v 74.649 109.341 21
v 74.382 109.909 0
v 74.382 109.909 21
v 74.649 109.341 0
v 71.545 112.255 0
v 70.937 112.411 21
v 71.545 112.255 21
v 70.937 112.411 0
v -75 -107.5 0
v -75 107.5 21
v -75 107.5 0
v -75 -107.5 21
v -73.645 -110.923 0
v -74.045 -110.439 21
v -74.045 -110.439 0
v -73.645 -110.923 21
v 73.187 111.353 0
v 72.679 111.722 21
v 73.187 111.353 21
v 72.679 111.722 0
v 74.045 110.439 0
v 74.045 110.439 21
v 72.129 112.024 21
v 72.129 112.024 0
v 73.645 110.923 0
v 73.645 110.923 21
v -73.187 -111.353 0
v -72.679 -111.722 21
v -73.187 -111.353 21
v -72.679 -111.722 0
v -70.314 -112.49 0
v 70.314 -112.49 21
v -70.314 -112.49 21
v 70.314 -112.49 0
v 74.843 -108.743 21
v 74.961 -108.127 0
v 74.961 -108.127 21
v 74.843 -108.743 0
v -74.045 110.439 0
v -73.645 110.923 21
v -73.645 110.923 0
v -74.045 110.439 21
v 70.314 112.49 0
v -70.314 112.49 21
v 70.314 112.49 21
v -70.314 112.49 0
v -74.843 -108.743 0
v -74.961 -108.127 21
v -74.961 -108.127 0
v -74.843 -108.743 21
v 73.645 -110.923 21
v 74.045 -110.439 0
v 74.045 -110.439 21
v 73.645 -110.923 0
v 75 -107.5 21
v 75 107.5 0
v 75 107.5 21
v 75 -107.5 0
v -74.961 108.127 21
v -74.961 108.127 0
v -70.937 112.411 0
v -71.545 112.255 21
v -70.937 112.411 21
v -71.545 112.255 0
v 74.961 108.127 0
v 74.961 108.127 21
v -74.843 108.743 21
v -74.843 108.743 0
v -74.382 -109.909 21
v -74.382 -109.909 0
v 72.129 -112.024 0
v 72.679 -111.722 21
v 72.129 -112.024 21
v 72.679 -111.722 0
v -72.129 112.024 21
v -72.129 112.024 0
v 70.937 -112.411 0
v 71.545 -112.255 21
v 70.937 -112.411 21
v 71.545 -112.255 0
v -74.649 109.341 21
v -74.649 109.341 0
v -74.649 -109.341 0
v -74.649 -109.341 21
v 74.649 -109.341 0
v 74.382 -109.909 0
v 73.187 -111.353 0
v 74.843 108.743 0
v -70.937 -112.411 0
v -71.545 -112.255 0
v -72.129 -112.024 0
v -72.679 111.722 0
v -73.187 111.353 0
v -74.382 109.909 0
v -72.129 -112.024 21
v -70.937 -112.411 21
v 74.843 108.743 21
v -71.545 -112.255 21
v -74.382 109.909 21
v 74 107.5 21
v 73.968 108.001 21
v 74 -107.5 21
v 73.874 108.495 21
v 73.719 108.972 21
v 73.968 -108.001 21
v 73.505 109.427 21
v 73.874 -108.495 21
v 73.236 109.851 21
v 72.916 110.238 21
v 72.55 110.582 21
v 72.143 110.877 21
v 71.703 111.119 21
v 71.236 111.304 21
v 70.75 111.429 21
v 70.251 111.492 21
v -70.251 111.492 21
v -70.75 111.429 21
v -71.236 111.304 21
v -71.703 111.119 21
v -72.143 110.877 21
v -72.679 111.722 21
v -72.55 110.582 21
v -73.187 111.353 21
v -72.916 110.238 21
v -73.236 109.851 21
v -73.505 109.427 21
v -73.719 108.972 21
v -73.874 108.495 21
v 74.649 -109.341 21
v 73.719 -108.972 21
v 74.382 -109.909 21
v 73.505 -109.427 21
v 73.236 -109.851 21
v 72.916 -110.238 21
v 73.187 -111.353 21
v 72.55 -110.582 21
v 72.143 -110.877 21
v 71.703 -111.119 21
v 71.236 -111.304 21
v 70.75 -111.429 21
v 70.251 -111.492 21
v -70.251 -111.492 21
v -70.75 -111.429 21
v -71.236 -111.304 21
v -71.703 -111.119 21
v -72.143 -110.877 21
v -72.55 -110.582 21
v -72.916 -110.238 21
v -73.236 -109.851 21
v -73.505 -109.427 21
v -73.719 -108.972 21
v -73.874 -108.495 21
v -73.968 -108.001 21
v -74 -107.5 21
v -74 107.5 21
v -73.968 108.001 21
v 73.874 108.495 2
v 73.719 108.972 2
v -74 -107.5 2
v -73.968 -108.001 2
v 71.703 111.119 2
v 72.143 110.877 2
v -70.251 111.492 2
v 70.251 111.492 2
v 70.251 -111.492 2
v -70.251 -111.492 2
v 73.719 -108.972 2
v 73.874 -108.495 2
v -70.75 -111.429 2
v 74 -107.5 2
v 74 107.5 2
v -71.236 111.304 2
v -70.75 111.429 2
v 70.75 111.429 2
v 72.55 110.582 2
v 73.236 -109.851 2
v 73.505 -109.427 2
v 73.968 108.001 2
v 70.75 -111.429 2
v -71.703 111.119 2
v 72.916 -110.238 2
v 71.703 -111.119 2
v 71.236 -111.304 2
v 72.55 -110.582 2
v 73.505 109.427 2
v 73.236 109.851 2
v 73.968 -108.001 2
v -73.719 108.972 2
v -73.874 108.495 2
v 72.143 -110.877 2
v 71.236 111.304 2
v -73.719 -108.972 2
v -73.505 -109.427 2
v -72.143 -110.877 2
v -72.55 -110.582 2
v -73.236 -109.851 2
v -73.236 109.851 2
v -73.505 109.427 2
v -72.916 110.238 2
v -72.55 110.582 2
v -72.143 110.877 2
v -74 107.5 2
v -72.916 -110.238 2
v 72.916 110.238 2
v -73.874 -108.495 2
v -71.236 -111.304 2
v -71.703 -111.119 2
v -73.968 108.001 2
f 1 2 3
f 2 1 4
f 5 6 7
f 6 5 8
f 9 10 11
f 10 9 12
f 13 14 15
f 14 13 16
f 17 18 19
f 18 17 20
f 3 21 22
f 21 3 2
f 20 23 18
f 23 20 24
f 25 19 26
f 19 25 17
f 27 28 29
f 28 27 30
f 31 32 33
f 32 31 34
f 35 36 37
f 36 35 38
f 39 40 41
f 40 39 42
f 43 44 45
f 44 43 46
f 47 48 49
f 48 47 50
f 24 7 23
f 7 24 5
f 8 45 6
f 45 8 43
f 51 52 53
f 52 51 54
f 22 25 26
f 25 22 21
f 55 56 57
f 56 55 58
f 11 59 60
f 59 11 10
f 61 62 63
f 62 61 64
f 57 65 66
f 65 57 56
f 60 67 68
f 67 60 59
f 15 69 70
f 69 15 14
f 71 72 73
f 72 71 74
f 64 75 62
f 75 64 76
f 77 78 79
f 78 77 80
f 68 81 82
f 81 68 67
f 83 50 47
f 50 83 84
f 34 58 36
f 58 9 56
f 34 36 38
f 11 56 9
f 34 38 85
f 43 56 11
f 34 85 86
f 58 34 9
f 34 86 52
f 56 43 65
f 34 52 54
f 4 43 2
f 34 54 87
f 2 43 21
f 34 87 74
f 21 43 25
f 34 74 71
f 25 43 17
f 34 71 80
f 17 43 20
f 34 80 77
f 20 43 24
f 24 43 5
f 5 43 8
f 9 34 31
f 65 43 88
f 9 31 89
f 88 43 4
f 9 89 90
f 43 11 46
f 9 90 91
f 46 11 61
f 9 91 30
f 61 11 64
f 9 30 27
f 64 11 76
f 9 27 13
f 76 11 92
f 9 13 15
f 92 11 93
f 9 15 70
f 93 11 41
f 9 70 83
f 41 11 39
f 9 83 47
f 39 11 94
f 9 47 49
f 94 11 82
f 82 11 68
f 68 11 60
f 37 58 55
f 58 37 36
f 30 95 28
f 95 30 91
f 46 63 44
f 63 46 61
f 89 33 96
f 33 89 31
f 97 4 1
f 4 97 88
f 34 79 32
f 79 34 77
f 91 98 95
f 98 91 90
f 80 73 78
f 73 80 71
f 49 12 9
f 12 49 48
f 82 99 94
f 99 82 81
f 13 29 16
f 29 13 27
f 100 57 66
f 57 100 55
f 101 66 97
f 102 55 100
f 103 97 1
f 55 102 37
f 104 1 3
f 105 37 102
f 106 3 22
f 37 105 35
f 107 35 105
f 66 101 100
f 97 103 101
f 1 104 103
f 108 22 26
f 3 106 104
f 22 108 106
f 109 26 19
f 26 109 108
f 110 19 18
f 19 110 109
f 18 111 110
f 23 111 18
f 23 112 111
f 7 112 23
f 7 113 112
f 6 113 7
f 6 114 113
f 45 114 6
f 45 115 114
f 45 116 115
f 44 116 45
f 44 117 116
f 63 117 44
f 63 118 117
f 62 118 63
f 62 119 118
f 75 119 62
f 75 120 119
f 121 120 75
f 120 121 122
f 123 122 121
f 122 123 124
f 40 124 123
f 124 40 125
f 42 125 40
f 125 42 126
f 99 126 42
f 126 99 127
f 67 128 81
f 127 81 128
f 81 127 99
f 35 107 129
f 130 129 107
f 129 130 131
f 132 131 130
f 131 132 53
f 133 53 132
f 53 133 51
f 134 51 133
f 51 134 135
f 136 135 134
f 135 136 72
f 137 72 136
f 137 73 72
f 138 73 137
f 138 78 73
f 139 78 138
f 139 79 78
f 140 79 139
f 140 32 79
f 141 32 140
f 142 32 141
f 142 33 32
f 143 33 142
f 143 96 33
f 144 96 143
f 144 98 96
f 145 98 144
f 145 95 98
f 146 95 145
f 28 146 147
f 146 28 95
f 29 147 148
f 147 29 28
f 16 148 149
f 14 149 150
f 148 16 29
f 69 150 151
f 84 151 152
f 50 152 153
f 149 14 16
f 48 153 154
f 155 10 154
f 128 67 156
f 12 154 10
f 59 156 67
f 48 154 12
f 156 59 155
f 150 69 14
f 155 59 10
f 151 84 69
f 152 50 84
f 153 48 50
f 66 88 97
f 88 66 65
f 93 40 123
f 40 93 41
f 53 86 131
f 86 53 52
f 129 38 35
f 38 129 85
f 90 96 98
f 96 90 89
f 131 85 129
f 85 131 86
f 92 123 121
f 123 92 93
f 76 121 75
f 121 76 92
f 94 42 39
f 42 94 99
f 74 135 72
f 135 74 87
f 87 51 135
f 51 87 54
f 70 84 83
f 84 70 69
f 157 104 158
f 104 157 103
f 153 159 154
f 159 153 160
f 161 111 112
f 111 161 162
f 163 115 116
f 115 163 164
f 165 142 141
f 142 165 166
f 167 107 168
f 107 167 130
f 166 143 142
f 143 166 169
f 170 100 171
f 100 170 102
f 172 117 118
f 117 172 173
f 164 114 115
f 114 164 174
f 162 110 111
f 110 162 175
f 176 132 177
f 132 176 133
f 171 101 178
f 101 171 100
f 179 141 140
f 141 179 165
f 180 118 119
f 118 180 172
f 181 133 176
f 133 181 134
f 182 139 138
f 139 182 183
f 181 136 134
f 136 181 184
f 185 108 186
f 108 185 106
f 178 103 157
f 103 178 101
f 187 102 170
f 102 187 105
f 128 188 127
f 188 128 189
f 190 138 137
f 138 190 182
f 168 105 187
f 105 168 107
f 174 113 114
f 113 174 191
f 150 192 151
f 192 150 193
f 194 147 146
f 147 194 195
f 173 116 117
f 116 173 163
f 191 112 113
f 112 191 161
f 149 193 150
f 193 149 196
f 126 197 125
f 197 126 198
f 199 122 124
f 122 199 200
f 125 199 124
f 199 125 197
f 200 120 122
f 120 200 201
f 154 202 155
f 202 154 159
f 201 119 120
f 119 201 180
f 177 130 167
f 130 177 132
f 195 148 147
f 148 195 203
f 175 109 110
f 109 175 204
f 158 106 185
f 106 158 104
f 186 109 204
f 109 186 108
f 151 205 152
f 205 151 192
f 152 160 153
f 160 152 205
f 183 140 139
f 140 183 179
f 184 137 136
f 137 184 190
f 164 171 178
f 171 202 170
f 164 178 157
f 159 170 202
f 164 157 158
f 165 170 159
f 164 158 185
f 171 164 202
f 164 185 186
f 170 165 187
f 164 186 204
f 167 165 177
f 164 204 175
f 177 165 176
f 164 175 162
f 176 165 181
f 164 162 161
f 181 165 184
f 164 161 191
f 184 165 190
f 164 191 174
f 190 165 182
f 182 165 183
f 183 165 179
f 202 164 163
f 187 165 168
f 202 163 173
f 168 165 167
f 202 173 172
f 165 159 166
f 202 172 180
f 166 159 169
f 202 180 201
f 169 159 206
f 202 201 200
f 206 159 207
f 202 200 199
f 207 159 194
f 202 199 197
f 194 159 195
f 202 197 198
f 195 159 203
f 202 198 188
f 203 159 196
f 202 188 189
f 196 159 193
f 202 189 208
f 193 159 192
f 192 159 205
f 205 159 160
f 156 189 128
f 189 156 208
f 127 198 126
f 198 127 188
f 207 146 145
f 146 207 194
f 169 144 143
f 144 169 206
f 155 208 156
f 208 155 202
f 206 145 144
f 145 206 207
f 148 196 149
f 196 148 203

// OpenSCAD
$fn = 50;


difference() {
	union() {
		hull() {
			translate(v = [-70.0000000000, 107.5000000000, 0]) {
				cylinder(h = 21, r = 5);
			}
			translate(v = [70.0000000000, 107.5000000000, 0]) {
				cylinder(h = 21, r = 5);
			}
			translate(v = [-70.0000000000, -107.5000000000, 0]) {
				cylinder(h = 21, r = 5);
			}
			translate(v = [70.0000000000, -107.5000000000, 0]) {
				cylinder(h = 21, r = 5);
			}
		}
	}
	union() {
		translate(v = [0, 0, 2]) {
			hull() {
				translate(v = [-70.0000000000, 107.5000000000, 0]) {
					cylinder(h = 19, r = 4);
				}
				translate(v = [70.0000000000, 107.5000000000, 0]) {
					cylinder(h = 19, r = 4);
				}
				translate(v = [-70.0000000000, -107.5000000000, 0]) {
					cylinder(h = 19, r = 4);
				}
				translate(v = [70.0000000000, -107.5000000000, 0]) {
					cylinder(h = 19, r = 4);
				}
			}
		}
	}
}
